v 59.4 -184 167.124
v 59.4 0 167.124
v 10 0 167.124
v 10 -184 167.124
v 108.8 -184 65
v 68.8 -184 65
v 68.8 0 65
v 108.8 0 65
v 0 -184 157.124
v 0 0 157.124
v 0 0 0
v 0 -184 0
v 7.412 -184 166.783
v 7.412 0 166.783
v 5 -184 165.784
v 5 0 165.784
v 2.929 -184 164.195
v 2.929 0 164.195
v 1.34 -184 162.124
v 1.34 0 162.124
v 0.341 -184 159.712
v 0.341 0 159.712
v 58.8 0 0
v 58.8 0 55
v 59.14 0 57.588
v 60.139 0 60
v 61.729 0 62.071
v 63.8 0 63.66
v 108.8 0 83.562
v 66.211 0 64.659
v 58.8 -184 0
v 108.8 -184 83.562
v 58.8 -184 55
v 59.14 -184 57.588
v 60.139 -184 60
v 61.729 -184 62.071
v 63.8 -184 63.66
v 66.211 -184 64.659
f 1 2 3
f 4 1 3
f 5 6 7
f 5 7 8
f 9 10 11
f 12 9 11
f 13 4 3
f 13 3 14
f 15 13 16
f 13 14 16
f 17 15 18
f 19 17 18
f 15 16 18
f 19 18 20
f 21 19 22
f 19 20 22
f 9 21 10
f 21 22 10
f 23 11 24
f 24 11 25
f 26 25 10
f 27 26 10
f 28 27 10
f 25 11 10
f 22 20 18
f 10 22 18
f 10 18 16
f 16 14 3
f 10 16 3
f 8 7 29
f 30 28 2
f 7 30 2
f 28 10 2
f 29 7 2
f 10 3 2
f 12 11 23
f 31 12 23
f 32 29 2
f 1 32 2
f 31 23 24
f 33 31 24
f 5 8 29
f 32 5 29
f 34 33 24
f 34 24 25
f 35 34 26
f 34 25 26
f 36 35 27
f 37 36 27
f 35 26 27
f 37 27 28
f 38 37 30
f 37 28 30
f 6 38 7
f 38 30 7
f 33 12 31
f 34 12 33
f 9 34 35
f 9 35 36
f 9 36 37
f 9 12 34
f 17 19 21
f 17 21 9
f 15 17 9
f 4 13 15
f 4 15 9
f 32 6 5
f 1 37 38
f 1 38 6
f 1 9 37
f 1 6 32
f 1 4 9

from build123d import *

# Parameters (mm, degrees)
F1_DEPTH = 184
F2_W     = 50
F2_H     = 65
F3_DEPTH = 321
F4_R     = 10


with BuildPart() as f1:
    # F0 (on Front) → F1 (new body)
    with BuildSketch(Plane.XZ):
        with BuildLine():
            Line((0, 157.123631), (0, 0))
            Line((0, 0), (108.799577, 0))
            Line((108.799577, 0), (108.799577, 83.561815))
            Line((108.799577, 83.561815), (59.399788, 167.123631))
            Line((59.399788, 167.123631), (10, 167.123631))
            ThreePointArc((10, 167.123631), (2.928932, 164.194698), (0, 157.123631))
        make_face()
    extrude(amount=F1_DEPTH)

    # F2 (on face) → F3 (cut)
    with BuildSketch(Plane.XZ.offset(184)):
        with Locations((83.799577, 32.5)):
            Rectangle(F2_W, F2_H)
    extrude(amount=-F3_DEPTH, mode=Mode.SUBTRACT)

    # F4
    f4_edges = [f1.edges().sort_by_distance(p)[0] for p in [
        (58.799577, -92, 65),
    ]]
    fillet(f4_edges, radius=F4_R)


solid = f1.part
